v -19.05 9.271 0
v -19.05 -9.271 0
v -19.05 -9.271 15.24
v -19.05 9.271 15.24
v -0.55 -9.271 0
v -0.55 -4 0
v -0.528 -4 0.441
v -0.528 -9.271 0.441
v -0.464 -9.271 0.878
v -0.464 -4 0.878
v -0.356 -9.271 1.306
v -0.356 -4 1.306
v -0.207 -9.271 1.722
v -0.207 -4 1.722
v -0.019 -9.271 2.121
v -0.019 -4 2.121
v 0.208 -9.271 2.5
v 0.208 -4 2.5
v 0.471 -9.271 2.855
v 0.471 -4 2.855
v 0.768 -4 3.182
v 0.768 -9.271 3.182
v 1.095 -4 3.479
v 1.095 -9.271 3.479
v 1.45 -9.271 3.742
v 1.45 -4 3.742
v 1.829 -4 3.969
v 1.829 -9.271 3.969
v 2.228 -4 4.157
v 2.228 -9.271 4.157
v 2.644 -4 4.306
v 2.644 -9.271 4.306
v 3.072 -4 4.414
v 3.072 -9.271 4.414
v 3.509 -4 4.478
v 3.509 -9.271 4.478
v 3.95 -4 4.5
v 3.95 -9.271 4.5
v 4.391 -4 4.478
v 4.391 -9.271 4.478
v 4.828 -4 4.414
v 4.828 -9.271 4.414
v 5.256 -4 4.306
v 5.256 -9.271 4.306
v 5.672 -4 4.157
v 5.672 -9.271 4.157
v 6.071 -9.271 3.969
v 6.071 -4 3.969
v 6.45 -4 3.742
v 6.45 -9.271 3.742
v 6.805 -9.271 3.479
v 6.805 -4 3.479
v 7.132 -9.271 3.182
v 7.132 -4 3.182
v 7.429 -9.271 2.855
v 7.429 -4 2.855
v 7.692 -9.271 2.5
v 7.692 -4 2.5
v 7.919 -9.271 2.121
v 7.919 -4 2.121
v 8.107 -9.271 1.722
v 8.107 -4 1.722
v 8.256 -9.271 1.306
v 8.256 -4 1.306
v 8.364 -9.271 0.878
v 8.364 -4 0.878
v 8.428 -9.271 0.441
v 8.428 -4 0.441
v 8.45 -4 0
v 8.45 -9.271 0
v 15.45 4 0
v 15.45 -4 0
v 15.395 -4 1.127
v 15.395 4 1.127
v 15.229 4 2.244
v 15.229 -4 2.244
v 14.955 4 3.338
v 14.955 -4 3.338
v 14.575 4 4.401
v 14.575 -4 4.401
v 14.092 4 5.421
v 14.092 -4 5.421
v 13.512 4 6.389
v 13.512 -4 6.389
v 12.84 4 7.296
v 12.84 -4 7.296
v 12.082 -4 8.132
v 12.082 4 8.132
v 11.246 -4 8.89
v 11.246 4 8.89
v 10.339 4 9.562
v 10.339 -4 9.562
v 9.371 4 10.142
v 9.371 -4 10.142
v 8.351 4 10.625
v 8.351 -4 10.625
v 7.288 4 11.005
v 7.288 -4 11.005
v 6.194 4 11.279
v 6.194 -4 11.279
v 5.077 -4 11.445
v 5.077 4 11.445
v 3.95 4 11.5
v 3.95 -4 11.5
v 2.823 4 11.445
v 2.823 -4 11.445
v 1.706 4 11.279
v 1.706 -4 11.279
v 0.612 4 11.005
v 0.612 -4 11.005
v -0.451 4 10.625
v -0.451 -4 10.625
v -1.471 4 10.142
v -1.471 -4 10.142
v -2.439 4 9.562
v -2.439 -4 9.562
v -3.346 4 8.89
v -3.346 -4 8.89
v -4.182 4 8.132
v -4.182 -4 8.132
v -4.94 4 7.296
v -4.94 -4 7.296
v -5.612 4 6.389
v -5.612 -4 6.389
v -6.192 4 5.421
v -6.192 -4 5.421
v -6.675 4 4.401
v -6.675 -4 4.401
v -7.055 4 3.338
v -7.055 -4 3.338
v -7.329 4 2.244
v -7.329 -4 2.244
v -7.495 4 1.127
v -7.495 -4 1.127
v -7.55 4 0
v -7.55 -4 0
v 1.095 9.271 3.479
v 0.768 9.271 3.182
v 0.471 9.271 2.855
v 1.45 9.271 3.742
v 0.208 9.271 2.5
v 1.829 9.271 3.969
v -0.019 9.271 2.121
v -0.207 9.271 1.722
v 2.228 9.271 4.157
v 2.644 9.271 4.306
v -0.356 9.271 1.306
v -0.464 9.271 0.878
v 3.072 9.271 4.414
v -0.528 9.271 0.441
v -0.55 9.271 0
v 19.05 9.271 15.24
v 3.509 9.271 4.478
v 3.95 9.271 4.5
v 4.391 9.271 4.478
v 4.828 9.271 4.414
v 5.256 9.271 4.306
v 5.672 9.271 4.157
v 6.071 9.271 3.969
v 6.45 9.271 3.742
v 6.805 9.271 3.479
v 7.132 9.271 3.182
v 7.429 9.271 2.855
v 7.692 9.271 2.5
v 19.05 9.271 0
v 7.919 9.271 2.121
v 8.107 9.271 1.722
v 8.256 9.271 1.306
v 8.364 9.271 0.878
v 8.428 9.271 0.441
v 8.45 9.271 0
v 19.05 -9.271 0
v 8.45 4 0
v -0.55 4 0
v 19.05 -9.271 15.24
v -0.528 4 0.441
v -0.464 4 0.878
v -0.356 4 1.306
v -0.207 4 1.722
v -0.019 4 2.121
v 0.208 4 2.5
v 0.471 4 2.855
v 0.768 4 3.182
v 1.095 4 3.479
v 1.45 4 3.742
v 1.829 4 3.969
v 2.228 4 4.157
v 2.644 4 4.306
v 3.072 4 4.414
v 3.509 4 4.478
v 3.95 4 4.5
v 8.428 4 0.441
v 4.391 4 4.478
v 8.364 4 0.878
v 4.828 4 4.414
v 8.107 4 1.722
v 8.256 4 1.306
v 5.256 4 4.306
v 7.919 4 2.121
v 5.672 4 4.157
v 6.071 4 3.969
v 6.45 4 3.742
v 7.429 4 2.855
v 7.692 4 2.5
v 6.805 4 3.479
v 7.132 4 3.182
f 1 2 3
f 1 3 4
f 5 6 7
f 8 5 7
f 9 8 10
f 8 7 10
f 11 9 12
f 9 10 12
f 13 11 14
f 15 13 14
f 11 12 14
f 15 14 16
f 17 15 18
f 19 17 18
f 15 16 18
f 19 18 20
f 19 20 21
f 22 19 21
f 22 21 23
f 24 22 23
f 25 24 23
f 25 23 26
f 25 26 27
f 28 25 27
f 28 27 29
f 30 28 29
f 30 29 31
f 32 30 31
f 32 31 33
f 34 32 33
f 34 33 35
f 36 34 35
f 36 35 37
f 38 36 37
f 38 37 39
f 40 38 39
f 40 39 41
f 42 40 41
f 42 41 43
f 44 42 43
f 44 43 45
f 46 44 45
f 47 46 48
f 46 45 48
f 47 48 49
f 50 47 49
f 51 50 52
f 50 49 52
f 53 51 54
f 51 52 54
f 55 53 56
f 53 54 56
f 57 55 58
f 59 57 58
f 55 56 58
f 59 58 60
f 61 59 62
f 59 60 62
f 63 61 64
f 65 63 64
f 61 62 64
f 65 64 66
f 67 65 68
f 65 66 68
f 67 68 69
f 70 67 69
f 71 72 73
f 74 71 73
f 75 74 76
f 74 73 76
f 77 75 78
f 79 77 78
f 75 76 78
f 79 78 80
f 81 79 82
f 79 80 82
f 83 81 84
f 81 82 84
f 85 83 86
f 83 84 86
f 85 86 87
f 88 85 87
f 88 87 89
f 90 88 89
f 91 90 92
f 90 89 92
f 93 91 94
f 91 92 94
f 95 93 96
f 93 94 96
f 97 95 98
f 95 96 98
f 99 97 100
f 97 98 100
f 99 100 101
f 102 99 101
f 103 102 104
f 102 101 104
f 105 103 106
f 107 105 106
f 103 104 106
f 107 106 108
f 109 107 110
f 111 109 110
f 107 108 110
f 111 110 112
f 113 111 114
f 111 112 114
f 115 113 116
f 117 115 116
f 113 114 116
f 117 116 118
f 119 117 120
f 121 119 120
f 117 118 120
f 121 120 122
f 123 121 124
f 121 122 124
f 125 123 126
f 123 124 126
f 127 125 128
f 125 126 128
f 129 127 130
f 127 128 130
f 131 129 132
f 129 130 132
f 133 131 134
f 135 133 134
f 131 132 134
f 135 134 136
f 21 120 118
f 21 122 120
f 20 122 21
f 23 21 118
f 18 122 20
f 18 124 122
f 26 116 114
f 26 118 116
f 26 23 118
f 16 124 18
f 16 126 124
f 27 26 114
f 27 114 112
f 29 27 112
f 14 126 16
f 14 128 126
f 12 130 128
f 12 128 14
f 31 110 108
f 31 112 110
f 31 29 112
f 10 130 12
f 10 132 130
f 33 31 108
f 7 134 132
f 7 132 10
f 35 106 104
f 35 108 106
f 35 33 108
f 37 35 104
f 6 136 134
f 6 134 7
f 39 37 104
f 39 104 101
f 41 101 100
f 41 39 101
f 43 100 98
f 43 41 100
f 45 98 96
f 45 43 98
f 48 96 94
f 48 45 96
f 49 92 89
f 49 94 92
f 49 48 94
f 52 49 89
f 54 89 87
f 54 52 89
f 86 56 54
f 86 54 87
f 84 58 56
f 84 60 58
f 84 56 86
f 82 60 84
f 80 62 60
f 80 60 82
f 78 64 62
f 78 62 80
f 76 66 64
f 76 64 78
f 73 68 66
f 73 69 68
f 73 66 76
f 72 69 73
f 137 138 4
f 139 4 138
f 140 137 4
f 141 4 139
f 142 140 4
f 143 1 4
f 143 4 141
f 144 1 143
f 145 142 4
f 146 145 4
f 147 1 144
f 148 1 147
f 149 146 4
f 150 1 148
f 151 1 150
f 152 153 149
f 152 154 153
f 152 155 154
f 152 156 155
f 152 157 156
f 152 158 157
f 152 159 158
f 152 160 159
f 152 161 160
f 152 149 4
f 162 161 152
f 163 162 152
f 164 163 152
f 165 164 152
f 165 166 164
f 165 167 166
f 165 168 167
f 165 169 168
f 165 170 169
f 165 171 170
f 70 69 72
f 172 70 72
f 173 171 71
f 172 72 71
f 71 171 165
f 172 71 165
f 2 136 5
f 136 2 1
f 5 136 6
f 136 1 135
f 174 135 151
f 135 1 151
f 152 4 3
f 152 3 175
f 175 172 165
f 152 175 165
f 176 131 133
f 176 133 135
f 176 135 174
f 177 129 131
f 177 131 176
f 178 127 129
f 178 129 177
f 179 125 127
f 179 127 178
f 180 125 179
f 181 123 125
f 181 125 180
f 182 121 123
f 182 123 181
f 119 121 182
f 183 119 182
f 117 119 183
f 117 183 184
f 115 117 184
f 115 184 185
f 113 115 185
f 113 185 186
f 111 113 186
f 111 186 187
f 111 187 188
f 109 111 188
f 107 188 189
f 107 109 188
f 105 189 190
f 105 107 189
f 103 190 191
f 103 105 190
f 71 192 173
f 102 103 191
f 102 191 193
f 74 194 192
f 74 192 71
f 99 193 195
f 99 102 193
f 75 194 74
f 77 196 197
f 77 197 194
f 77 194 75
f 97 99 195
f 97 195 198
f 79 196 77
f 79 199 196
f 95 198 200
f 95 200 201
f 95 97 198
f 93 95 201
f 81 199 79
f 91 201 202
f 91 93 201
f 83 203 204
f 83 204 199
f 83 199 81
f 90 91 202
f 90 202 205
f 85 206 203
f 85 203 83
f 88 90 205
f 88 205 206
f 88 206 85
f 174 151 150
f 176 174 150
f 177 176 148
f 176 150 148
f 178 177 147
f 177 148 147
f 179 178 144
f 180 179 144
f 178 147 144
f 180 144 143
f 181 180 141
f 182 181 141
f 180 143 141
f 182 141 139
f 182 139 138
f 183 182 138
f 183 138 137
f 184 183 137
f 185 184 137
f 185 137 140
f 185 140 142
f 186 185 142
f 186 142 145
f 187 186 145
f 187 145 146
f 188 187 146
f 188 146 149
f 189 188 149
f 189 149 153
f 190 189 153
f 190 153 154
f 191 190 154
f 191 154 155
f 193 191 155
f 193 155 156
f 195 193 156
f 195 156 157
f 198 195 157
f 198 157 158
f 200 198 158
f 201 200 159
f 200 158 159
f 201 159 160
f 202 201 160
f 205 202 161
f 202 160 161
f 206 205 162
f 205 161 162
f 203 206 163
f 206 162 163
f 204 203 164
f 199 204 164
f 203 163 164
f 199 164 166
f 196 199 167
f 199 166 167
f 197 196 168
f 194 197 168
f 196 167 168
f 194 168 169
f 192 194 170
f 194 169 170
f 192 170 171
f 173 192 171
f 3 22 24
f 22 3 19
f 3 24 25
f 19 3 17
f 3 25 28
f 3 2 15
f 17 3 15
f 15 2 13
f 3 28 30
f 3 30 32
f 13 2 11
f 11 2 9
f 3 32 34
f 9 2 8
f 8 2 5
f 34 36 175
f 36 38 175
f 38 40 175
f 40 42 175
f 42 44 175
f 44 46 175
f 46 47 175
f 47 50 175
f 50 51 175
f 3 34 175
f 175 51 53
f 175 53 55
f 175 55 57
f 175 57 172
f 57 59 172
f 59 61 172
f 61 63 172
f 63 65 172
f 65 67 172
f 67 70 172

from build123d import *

# Parameters (mm, degrees)
F0_W     = 38.1
F0_H     = 13.271
F1_DEPTH = 15.24
F3_DEPTH = 8
F0_H_2   = 5.271
F4_DEPTH = 15.24
F5_R     = 4.5
F6_DEPTH = 50.8


with BuildPart() as f1:
    # F0 (on Top) → F1 (new body)
    with BuildSketch(Plane.XY):
        with Locations((0, 2.6355)):
            Rectangle(F0_W, F0_H)
    extrude(amount=F1_DEPTH)

    # F2 (on face) → F3 (cut)
    with BuildSketch(Plane.XZ.offset(4)):
        with BuildLine():
            Line((8.45, 0), (15.45, 0))
            ThreePointArc((15.45, 0), (3.95, 11.5), (-7.55, 0))
            Line((-7.55, 0), (-0.55, 0))
            ThreePointArc((-0.55, 0), (3.95, 4.5), (8.45, 0))
        make_face()
        with BuildLine():
            Line((-0.55, 0), (8.45, 0))
            ThreePointArc((8.45, 0), (3.95, 4.5), (-0.55, 0))
        make_face()
    extrude(amount=-F3_DEPTH, mode=Mode.SUBTRACT)

    # F0 (on Top) → F4 (join)
    with BuildSketch(Plane.XY):
        with Locations((0, -6.6355)):
            Rectangle(F0_W, F0_H_2)
    extrude(amount=F4_DEPTH)

    # F5 (on face) → F6 (cut)
    with BuildSketch(Plane(origin=(0, 9.271, 0), x_dir=(-1, 0, 0), z_dir=(0, 1, 0))):
        with Locations((-3.95, 0)):
            Circle(F5_R)
    extrude(amount=-F6_DEPTH, mode=Mode.SUBTRACT)


solid = f1.part
